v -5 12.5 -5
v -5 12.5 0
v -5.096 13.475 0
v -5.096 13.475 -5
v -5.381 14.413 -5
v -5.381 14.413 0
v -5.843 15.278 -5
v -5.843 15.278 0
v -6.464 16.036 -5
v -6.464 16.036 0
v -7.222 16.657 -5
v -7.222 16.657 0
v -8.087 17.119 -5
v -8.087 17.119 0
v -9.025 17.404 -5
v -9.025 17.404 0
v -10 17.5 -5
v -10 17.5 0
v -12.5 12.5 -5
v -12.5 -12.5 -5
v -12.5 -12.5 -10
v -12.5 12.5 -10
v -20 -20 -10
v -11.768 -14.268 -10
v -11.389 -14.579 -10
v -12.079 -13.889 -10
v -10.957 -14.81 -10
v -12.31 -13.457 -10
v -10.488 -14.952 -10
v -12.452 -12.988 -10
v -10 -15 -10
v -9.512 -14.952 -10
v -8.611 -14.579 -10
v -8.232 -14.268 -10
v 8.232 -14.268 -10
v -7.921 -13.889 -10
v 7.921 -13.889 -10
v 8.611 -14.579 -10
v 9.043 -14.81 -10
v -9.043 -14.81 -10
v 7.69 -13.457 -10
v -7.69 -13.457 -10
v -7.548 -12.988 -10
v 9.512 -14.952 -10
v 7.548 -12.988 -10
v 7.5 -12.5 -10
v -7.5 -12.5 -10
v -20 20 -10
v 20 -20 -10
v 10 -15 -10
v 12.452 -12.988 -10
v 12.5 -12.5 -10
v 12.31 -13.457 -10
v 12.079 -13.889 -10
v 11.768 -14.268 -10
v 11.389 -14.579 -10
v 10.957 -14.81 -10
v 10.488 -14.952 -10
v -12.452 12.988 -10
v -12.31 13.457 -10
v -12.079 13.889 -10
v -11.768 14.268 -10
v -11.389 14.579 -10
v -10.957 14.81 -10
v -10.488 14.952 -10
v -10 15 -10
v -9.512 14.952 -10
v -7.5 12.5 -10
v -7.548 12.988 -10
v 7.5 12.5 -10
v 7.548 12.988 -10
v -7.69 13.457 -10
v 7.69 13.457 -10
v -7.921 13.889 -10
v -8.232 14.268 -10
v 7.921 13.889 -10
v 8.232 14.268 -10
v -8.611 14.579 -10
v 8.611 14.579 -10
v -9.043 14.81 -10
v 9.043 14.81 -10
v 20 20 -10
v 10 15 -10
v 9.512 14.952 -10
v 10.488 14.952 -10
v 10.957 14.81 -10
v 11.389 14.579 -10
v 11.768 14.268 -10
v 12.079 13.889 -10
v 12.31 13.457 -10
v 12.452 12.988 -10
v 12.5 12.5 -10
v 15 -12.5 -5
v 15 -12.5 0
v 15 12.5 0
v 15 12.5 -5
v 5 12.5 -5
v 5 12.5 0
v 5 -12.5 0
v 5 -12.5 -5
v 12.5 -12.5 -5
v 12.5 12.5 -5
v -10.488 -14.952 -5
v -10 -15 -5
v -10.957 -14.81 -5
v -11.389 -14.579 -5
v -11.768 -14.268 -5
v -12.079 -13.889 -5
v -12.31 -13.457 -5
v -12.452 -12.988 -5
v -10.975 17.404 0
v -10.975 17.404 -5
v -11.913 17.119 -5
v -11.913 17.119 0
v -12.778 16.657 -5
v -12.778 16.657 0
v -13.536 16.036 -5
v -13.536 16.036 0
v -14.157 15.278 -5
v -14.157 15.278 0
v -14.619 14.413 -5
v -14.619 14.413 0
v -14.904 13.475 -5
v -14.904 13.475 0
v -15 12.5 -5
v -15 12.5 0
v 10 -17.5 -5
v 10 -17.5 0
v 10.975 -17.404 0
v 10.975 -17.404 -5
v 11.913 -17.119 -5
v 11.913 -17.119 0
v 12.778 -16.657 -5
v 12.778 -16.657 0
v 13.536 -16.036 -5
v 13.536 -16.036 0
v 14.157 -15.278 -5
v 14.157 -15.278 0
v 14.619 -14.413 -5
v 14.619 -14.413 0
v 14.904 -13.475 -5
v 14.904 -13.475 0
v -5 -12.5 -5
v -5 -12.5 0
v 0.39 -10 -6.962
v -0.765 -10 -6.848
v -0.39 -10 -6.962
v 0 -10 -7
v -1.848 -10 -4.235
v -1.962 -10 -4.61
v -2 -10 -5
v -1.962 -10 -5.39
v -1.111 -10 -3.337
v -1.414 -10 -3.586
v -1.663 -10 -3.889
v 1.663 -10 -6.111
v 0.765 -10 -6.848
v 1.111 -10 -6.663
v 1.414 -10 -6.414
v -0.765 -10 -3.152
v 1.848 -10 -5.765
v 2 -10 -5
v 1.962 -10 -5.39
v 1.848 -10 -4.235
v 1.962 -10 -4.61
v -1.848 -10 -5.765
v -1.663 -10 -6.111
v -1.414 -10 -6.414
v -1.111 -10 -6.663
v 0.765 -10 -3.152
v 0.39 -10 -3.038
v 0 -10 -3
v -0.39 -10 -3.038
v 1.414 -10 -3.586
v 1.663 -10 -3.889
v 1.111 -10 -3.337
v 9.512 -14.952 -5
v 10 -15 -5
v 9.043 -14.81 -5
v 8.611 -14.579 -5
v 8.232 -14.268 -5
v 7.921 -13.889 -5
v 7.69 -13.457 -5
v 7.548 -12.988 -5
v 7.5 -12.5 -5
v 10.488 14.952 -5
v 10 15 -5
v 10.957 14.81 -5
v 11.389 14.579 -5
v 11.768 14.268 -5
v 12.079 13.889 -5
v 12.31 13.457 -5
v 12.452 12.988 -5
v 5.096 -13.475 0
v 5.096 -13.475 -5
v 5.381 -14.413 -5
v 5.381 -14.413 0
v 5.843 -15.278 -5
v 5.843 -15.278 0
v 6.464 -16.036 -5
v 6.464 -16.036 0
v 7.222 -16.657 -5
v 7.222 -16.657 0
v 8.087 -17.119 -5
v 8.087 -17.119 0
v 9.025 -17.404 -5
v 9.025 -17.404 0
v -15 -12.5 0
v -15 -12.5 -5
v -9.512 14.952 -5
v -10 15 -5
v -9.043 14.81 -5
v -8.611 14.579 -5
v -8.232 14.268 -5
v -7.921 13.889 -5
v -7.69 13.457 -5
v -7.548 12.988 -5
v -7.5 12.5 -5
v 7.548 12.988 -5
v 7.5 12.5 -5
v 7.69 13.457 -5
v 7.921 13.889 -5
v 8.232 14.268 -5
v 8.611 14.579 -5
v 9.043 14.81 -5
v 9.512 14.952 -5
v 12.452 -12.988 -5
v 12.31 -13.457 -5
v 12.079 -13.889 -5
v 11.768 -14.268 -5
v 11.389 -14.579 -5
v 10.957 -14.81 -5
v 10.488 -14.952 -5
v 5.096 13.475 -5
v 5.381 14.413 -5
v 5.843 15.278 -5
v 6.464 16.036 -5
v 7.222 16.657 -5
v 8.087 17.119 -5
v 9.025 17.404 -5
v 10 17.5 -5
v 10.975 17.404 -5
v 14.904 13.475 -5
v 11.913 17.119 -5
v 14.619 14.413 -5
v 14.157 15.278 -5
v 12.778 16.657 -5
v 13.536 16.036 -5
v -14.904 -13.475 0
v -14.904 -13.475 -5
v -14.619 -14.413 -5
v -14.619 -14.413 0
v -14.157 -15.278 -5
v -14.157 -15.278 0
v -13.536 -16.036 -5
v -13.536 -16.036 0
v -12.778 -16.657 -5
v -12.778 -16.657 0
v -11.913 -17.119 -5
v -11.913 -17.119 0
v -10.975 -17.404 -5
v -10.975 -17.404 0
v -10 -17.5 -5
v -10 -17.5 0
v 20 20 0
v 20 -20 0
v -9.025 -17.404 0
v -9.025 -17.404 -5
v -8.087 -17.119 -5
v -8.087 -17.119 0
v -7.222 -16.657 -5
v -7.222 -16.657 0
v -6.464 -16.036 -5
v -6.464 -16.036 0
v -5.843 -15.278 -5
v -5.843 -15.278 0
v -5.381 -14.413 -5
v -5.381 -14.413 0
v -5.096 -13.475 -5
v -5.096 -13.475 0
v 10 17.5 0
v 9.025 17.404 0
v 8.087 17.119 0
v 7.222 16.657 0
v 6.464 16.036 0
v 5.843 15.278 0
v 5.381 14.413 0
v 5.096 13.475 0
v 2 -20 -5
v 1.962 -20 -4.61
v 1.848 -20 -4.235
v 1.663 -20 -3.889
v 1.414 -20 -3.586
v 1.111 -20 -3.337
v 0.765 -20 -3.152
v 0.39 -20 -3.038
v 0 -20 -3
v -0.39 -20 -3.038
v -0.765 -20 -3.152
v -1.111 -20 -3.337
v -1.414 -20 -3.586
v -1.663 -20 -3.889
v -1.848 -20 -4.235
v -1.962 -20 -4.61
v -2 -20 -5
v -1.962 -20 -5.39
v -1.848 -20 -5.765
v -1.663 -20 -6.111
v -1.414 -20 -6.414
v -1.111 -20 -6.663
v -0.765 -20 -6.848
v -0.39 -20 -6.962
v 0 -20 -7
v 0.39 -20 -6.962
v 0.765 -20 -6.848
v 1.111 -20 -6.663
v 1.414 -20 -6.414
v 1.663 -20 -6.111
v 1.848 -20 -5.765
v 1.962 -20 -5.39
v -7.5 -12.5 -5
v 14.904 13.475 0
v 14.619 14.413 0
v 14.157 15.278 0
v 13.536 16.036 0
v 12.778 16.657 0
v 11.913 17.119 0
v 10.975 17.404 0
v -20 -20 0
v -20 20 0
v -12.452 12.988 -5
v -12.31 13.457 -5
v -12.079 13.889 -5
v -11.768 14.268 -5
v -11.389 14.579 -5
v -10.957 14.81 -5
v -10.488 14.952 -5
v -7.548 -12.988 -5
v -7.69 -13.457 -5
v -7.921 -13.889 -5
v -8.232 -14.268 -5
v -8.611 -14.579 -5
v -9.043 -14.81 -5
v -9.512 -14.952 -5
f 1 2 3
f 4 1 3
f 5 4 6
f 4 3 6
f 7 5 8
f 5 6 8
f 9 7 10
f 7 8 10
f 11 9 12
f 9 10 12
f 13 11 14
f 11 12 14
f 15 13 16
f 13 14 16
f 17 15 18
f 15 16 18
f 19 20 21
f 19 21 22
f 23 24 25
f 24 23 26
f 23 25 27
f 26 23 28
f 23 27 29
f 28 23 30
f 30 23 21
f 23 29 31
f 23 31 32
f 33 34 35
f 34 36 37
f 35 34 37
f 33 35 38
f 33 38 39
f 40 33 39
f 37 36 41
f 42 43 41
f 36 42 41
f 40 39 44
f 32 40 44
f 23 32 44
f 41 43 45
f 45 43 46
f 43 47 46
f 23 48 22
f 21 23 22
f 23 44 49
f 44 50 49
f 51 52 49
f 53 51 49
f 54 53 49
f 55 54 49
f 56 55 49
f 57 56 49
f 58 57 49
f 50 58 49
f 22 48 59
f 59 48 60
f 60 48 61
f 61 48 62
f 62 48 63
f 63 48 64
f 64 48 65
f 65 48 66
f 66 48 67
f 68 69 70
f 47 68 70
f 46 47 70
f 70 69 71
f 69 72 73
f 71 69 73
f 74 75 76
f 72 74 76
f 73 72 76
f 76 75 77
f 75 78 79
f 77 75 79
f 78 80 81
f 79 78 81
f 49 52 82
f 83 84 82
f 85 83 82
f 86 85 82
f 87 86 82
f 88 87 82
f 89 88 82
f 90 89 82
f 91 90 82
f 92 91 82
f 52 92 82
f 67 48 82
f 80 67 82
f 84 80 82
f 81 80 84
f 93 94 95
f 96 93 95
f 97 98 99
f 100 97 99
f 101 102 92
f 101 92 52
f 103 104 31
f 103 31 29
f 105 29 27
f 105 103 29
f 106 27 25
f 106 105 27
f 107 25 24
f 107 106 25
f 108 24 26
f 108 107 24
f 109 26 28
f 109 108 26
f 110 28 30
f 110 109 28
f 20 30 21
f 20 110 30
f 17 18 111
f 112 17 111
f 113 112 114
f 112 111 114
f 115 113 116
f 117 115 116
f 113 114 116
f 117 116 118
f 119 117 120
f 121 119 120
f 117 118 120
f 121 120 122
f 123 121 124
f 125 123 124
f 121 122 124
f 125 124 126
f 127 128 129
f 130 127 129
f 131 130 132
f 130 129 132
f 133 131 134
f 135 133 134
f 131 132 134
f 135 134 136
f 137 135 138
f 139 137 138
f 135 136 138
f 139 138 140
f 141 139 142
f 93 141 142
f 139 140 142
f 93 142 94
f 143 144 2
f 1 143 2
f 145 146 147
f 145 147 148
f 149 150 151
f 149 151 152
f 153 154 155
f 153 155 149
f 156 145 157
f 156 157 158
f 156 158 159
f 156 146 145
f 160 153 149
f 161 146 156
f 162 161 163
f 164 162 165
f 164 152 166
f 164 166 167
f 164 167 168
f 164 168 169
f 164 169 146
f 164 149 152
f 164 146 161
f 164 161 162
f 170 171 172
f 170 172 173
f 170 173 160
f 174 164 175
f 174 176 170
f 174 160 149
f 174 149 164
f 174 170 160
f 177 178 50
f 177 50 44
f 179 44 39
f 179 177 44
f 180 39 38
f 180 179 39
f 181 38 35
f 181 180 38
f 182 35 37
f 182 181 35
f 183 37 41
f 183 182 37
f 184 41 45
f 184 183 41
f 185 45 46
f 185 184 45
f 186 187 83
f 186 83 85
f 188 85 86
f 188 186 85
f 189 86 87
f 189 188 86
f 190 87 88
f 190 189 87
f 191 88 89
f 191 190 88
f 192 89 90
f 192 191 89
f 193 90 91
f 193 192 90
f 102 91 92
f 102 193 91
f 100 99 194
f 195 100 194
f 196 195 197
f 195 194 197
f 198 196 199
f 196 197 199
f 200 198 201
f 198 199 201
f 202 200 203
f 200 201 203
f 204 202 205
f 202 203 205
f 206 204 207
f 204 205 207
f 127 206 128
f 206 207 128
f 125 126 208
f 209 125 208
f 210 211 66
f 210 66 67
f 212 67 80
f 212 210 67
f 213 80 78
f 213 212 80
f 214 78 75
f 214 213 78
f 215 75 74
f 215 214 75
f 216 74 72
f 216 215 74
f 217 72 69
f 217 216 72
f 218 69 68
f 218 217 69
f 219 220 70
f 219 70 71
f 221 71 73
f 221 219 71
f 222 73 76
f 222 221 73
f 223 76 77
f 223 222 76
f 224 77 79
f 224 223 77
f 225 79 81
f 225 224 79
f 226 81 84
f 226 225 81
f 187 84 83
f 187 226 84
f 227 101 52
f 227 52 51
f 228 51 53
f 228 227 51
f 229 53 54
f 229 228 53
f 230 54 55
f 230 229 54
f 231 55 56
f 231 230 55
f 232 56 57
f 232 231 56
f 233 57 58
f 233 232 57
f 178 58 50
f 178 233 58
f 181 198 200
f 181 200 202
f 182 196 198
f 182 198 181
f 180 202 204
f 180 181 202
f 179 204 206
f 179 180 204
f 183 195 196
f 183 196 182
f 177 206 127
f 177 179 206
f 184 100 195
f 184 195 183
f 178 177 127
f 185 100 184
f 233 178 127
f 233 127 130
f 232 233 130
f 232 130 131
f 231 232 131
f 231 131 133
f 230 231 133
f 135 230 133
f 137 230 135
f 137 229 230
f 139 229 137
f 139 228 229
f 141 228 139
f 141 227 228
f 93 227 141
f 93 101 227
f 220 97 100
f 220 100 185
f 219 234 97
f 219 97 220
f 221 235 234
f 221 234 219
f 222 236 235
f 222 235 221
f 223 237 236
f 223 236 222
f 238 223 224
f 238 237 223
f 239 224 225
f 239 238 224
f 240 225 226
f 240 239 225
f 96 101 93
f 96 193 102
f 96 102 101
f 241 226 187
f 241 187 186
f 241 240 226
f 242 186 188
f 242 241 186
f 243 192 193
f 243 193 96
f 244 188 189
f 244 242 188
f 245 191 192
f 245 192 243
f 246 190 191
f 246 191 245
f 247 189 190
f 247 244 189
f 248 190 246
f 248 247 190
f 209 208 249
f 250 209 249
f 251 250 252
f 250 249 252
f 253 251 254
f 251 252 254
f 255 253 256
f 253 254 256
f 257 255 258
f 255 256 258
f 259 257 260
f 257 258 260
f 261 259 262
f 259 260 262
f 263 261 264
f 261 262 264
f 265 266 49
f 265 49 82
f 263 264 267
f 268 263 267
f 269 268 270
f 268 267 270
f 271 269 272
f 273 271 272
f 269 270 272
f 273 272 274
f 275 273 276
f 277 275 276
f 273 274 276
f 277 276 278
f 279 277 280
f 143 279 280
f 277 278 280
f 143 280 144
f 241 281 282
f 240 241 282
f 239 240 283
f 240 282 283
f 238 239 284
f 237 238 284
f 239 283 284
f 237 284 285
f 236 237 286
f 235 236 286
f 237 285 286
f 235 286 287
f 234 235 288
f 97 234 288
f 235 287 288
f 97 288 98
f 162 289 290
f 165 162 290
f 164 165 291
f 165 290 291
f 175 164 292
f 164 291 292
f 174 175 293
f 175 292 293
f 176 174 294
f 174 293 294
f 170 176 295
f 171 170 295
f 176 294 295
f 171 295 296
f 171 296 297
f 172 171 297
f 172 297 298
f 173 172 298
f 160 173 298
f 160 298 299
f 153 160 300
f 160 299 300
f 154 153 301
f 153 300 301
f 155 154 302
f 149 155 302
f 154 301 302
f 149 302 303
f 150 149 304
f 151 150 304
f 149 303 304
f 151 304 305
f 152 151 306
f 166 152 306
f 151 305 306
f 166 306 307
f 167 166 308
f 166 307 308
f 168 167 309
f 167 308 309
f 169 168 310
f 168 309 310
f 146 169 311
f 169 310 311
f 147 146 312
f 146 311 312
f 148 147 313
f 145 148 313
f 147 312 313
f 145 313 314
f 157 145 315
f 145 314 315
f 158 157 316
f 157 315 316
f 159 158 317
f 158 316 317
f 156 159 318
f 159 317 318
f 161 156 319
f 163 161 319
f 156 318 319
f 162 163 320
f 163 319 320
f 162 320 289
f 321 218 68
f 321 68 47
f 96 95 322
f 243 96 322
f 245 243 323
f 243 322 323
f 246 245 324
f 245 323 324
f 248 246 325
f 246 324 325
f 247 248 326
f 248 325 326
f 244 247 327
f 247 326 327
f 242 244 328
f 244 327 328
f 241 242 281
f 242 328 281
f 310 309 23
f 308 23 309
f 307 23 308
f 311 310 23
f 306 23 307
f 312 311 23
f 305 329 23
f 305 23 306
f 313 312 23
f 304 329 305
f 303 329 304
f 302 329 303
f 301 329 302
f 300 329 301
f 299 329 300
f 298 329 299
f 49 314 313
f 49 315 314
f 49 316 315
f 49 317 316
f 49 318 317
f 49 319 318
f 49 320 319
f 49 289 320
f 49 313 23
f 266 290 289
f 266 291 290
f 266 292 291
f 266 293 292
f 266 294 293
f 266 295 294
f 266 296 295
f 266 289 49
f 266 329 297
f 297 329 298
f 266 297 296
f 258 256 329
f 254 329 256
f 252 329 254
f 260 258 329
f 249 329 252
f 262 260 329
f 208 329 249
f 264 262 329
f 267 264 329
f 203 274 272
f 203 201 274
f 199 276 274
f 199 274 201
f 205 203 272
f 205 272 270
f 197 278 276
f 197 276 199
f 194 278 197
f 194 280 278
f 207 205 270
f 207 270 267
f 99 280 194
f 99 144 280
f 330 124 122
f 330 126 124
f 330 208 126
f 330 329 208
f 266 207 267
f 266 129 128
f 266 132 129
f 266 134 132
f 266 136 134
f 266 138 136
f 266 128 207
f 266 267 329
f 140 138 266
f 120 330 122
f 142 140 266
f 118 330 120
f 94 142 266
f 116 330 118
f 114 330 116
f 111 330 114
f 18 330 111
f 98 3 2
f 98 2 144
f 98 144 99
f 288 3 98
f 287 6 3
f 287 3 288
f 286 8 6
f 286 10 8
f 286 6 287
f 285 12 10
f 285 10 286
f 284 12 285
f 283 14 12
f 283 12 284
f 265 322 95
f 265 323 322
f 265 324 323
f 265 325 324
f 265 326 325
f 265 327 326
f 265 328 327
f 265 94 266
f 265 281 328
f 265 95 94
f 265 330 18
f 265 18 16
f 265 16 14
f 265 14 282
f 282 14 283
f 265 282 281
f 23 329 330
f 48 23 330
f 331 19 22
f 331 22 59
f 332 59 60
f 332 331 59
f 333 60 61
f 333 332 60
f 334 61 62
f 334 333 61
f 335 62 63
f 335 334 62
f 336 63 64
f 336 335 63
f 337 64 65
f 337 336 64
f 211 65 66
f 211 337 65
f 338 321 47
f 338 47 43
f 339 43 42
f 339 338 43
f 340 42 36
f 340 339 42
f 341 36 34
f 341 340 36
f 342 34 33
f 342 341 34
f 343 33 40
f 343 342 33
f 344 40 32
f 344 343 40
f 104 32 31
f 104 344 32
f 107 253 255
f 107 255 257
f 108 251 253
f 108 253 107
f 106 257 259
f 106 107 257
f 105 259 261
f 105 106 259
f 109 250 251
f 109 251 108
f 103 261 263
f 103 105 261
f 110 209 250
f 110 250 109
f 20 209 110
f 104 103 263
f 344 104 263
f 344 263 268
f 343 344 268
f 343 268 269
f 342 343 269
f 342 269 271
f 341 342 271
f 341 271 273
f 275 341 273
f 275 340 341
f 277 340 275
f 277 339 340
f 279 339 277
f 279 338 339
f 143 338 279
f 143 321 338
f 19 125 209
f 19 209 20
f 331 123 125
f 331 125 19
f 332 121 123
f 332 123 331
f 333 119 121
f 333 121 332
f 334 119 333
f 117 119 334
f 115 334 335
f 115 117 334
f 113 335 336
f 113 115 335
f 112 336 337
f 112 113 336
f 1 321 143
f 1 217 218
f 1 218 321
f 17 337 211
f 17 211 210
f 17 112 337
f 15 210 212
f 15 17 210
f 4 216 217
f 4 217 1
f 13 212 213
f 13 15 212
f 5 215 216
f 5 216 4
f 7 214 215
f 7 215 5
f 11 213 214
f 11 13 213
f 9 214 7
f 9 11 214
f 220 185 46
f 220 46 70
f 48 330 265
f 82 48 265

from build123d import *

# Parameters (mm, degrees)
F0_W     = 40
F0_H     = 40
F1_DEPTH = 10
F2_DEPTH = 5
F3_R     = 2
F4_DEPTH = 10


with BuildPart() as f1:
    # F0 (on Top) → F1 (new body)
    with BuildSketch(Plane.XY):
        Rectangle(F0_W, F0_H)
        with BuildLine():
            Line((-15, -12.5), (-15, 12.5))
            ThreePointArc((-15, 12.5), (-13.535534, 16.035534), (-10, 17.5))
            ThreePointArc((-10, 17.5), (-6.464466, 16.035534), (-5, 12.5))
            Line((-5, 12.5), (-5, -12.5))
            ThreePointArc((-5, -12.5), (-6.464466, -16.035534), (-10, -17.5))
            ThreePointArc((-10, -17.5), (-13.535534, -16.035534), (-15, -12.5))
        make_face(mode=Mode.SUBTRACT)
        with BuildLine():
            Line((5, -12.5), (5, 12.5))
            ThreePointArc((5, 12.5), (6.464466, 16.035534), (10, 17.5))
            ThreePointArc((10, 17.5), (13.535534, 16.035534), (15, 12.5))
            Line((15, 12.5), (15, -12.5))
            ThreePointArc((15, -12.5), (13.535534, -16.035534), (10, -17.5))
            ThreePointArc((10, -17.5), (6.464466, -16.035534), (5, -12.5))
        make_face(mode=Mode.SUBTRACT)
        with BuildLine():
            ThreePointArc((-10, 17.5), (-13.535534, 16.035534), (-15, 12.5))
            Line((-15, 12.5), (-15, -12.5))
            ThreePointArc((-15, -12.5), (-13.535534, -16.035534), (-10, -17.5))
            ThreePointArc((-10, -17.5), (-6.464466, -16.035534), (-5, -12.5))
            Line((-5, -12.5), (-5, 12.5))
            ThreePointArc((-5, 12.5), (-6.464466, 16.035534), (-10, 17.5))
        make_face()
        with BuildLine():
            ThreePointArc((-10, 15), (-8.232233, 14.267767), (-7.5, 12.5))
            Line((-7.5, 12.5), (-7.5, -12.5))
            ThreePointArc((-7.5, -12.5), (-8.232233, -14.267767), (-10, -15))
            ThreePointArc((-10, -15), (-11.767767, -14.267767), (-12.5, -12.5))
            Line((-12.5, -12.5), (-12.5, 12.5))
            ThreePointArc((-12.5, 12.5), (-11.767767, 14.267767), (-10, 15))
        make_face(mode=Mode.SUBTRACT)
        with BuildLine():
            ThreePointArc((10, 17.5), (6.464466, 16.035534), (5, 12.5))
            Line((5, 12.5), (5, -12.5))
            ThreePointArc((5, -12.5), (6.464466, -16.035534), (10, -17.5))
            ThreePointArc((10, -17.5), (13.535534, -16.035534), (15, -12.5))
            Line((15, -12.5), (15, 12.5))
            ThreePointArc((15, 12.5), (13.535534, 16.035534), (10, 17.5))
        make_face()
        with BuildLine():
            Line((7.5, -12.5), (7.5, 12.5))
            ThreePointArc((7.5, 12.5), (8.232233, 14.267767), (10, 15))
            ThreePointArc((10, 15), (11.767767, 14.267767), (12.5, 12.5))
            Line((12.5, 12.5), (12.5, -12.5))
            ThreePointArc((12.5, -12.5), (11.767767, -14.267767), (10, -15))
            ThreePointArc((10, -15), (8.232233, -14.267767), (7.5, -12.5))
        make_face(mode=Mode.SUBTRACT)
    extrude(amount=-F1_DEPTH)

    # F0 (on Top) → F2 (cut)
    with BuildSketch(Plane.XY):
        with BuildLine():
            Line((-7.5, -12.5), (-7.5, 12.5))
            ThreePointArc((-7.5, 12.5), (-8.232233, 14.267767), (-10, 15))
            ThreePointArc((-10, 15), (-11.767767, 14.267767), (-12.5, 12.5))
            Line((-12.5, 12.5), (-12.5, -12.5))
            ThreePointArc((-12.5, -12.5), (-11.767767, -14.267767), (-10, -15))
            ThreePointArc((-10, -15), (-8.232233, -14.267767), (-7.5, -12.5))
        make_face()
        with BuildLine():
            ThreePointArc((10, 15), (8.232233, 14.267767), (7.5, 12.5))
            Line((7.5, 12.5), (7.5, -12.5))
            ThreePointArc((7.5, -12.5), (8.232233, -14.267767), (10, -15))
            ThreePointArc((10, -15), (11.767767, -14.267767), (12.5, -12.5))
            Line((12.5, -12.5), (12.5, 12.5))
            ThreePointArc((12.5, 12.5), (11.767767, 14.267767), (10, 15))
        make_face()
        with BuildLine():
            ThreePointArc((10, 17.5), (6.464466, 16.035534), (5, 12.5))
            Line((5, 12.5), (5, -12.5))
            ThreePointArc((5, -12.5), (6.464466, -16.035534), (10, -17.5))
            ThreePointArc((10, -17.5), (13.535534, -16.035534), (15, -12.5))
            Line((15, -12.5), (15, 12.5))
            ThreePointArc((15, 12.5), (13.535534, 16.035534), (10, 17.5))
        make_face()
        with BuildLine():
            Line((7.5, -12.5), (7.5, 12.5))
            ThreePointArc((7.5, 12.5), (8.232233, 14.267767), (10, 15))
            ThreePointArc((10, 15), (11.767767, 14.267767), (12.5, 12.5))
            Line((12.5, 12.5), (12.5, -12.5))
            ThreePointArc((12.5, -12.5), (11.767767, -14.267767), (10, -15))
            ThreePointArc((10, -15), (8.232233, -14.267767), (7.5, -12.5))
        make_face(mode=Mode.SUBTRACT)
        with BuildLine():
            ThreePointArc((-10, 17.5), (-13.535534, 16.035534), (-15, 12.5))
            Line((-15, 12.5), (-15, -12.5))
            ThreePointArc((-15, -12.5), (-13.535534, -16.035534), (-10, -17.5))
            ThreePointArc((-10, -17.5), (-6.464466, -16.035534), (-5, -12.5))
            Line((-5, -12.5), (-5, 12.5))
            ThreePointArc((-5, 12.5), (-6.464466, 16.035534), (-10, 17.5))
        make_face()
        with BuildLine():
            ThreePointArc((-10, 15), (-8.232233, 14.267767), (-7.5, 12.5))
            Line((-7.5, 12.5), (-7.5, -12.5))
            ThreePointArc((-7.5, -12.5), (-8.232233, -14.267767), (-10, -15))
            ThreePointArc((-10, -15), (-11.767767, -14.267767), (-12.5, -12.5))
            Line((-12.5, -12.5), (-12.5, 12.5))
            ThreePointArc((-12.5, 12.5), (-11.767767, 14.267767), (-10, 15))
        make_face(mode=Mode.SUBTRACT)
    extrude(amount=-F2_DEPTH, mode=Mode.SUBTRACT)

    # F3 (on face) → F4 (cut)
    with BuildSketch(Plane.XZ.offset(20)):
        with Locations((0, -5)):
            Circle(F3_R)
    extrude(amount=-F4_DEPTH, mode=Mode.SUBTRACT)


solid = f1.part
